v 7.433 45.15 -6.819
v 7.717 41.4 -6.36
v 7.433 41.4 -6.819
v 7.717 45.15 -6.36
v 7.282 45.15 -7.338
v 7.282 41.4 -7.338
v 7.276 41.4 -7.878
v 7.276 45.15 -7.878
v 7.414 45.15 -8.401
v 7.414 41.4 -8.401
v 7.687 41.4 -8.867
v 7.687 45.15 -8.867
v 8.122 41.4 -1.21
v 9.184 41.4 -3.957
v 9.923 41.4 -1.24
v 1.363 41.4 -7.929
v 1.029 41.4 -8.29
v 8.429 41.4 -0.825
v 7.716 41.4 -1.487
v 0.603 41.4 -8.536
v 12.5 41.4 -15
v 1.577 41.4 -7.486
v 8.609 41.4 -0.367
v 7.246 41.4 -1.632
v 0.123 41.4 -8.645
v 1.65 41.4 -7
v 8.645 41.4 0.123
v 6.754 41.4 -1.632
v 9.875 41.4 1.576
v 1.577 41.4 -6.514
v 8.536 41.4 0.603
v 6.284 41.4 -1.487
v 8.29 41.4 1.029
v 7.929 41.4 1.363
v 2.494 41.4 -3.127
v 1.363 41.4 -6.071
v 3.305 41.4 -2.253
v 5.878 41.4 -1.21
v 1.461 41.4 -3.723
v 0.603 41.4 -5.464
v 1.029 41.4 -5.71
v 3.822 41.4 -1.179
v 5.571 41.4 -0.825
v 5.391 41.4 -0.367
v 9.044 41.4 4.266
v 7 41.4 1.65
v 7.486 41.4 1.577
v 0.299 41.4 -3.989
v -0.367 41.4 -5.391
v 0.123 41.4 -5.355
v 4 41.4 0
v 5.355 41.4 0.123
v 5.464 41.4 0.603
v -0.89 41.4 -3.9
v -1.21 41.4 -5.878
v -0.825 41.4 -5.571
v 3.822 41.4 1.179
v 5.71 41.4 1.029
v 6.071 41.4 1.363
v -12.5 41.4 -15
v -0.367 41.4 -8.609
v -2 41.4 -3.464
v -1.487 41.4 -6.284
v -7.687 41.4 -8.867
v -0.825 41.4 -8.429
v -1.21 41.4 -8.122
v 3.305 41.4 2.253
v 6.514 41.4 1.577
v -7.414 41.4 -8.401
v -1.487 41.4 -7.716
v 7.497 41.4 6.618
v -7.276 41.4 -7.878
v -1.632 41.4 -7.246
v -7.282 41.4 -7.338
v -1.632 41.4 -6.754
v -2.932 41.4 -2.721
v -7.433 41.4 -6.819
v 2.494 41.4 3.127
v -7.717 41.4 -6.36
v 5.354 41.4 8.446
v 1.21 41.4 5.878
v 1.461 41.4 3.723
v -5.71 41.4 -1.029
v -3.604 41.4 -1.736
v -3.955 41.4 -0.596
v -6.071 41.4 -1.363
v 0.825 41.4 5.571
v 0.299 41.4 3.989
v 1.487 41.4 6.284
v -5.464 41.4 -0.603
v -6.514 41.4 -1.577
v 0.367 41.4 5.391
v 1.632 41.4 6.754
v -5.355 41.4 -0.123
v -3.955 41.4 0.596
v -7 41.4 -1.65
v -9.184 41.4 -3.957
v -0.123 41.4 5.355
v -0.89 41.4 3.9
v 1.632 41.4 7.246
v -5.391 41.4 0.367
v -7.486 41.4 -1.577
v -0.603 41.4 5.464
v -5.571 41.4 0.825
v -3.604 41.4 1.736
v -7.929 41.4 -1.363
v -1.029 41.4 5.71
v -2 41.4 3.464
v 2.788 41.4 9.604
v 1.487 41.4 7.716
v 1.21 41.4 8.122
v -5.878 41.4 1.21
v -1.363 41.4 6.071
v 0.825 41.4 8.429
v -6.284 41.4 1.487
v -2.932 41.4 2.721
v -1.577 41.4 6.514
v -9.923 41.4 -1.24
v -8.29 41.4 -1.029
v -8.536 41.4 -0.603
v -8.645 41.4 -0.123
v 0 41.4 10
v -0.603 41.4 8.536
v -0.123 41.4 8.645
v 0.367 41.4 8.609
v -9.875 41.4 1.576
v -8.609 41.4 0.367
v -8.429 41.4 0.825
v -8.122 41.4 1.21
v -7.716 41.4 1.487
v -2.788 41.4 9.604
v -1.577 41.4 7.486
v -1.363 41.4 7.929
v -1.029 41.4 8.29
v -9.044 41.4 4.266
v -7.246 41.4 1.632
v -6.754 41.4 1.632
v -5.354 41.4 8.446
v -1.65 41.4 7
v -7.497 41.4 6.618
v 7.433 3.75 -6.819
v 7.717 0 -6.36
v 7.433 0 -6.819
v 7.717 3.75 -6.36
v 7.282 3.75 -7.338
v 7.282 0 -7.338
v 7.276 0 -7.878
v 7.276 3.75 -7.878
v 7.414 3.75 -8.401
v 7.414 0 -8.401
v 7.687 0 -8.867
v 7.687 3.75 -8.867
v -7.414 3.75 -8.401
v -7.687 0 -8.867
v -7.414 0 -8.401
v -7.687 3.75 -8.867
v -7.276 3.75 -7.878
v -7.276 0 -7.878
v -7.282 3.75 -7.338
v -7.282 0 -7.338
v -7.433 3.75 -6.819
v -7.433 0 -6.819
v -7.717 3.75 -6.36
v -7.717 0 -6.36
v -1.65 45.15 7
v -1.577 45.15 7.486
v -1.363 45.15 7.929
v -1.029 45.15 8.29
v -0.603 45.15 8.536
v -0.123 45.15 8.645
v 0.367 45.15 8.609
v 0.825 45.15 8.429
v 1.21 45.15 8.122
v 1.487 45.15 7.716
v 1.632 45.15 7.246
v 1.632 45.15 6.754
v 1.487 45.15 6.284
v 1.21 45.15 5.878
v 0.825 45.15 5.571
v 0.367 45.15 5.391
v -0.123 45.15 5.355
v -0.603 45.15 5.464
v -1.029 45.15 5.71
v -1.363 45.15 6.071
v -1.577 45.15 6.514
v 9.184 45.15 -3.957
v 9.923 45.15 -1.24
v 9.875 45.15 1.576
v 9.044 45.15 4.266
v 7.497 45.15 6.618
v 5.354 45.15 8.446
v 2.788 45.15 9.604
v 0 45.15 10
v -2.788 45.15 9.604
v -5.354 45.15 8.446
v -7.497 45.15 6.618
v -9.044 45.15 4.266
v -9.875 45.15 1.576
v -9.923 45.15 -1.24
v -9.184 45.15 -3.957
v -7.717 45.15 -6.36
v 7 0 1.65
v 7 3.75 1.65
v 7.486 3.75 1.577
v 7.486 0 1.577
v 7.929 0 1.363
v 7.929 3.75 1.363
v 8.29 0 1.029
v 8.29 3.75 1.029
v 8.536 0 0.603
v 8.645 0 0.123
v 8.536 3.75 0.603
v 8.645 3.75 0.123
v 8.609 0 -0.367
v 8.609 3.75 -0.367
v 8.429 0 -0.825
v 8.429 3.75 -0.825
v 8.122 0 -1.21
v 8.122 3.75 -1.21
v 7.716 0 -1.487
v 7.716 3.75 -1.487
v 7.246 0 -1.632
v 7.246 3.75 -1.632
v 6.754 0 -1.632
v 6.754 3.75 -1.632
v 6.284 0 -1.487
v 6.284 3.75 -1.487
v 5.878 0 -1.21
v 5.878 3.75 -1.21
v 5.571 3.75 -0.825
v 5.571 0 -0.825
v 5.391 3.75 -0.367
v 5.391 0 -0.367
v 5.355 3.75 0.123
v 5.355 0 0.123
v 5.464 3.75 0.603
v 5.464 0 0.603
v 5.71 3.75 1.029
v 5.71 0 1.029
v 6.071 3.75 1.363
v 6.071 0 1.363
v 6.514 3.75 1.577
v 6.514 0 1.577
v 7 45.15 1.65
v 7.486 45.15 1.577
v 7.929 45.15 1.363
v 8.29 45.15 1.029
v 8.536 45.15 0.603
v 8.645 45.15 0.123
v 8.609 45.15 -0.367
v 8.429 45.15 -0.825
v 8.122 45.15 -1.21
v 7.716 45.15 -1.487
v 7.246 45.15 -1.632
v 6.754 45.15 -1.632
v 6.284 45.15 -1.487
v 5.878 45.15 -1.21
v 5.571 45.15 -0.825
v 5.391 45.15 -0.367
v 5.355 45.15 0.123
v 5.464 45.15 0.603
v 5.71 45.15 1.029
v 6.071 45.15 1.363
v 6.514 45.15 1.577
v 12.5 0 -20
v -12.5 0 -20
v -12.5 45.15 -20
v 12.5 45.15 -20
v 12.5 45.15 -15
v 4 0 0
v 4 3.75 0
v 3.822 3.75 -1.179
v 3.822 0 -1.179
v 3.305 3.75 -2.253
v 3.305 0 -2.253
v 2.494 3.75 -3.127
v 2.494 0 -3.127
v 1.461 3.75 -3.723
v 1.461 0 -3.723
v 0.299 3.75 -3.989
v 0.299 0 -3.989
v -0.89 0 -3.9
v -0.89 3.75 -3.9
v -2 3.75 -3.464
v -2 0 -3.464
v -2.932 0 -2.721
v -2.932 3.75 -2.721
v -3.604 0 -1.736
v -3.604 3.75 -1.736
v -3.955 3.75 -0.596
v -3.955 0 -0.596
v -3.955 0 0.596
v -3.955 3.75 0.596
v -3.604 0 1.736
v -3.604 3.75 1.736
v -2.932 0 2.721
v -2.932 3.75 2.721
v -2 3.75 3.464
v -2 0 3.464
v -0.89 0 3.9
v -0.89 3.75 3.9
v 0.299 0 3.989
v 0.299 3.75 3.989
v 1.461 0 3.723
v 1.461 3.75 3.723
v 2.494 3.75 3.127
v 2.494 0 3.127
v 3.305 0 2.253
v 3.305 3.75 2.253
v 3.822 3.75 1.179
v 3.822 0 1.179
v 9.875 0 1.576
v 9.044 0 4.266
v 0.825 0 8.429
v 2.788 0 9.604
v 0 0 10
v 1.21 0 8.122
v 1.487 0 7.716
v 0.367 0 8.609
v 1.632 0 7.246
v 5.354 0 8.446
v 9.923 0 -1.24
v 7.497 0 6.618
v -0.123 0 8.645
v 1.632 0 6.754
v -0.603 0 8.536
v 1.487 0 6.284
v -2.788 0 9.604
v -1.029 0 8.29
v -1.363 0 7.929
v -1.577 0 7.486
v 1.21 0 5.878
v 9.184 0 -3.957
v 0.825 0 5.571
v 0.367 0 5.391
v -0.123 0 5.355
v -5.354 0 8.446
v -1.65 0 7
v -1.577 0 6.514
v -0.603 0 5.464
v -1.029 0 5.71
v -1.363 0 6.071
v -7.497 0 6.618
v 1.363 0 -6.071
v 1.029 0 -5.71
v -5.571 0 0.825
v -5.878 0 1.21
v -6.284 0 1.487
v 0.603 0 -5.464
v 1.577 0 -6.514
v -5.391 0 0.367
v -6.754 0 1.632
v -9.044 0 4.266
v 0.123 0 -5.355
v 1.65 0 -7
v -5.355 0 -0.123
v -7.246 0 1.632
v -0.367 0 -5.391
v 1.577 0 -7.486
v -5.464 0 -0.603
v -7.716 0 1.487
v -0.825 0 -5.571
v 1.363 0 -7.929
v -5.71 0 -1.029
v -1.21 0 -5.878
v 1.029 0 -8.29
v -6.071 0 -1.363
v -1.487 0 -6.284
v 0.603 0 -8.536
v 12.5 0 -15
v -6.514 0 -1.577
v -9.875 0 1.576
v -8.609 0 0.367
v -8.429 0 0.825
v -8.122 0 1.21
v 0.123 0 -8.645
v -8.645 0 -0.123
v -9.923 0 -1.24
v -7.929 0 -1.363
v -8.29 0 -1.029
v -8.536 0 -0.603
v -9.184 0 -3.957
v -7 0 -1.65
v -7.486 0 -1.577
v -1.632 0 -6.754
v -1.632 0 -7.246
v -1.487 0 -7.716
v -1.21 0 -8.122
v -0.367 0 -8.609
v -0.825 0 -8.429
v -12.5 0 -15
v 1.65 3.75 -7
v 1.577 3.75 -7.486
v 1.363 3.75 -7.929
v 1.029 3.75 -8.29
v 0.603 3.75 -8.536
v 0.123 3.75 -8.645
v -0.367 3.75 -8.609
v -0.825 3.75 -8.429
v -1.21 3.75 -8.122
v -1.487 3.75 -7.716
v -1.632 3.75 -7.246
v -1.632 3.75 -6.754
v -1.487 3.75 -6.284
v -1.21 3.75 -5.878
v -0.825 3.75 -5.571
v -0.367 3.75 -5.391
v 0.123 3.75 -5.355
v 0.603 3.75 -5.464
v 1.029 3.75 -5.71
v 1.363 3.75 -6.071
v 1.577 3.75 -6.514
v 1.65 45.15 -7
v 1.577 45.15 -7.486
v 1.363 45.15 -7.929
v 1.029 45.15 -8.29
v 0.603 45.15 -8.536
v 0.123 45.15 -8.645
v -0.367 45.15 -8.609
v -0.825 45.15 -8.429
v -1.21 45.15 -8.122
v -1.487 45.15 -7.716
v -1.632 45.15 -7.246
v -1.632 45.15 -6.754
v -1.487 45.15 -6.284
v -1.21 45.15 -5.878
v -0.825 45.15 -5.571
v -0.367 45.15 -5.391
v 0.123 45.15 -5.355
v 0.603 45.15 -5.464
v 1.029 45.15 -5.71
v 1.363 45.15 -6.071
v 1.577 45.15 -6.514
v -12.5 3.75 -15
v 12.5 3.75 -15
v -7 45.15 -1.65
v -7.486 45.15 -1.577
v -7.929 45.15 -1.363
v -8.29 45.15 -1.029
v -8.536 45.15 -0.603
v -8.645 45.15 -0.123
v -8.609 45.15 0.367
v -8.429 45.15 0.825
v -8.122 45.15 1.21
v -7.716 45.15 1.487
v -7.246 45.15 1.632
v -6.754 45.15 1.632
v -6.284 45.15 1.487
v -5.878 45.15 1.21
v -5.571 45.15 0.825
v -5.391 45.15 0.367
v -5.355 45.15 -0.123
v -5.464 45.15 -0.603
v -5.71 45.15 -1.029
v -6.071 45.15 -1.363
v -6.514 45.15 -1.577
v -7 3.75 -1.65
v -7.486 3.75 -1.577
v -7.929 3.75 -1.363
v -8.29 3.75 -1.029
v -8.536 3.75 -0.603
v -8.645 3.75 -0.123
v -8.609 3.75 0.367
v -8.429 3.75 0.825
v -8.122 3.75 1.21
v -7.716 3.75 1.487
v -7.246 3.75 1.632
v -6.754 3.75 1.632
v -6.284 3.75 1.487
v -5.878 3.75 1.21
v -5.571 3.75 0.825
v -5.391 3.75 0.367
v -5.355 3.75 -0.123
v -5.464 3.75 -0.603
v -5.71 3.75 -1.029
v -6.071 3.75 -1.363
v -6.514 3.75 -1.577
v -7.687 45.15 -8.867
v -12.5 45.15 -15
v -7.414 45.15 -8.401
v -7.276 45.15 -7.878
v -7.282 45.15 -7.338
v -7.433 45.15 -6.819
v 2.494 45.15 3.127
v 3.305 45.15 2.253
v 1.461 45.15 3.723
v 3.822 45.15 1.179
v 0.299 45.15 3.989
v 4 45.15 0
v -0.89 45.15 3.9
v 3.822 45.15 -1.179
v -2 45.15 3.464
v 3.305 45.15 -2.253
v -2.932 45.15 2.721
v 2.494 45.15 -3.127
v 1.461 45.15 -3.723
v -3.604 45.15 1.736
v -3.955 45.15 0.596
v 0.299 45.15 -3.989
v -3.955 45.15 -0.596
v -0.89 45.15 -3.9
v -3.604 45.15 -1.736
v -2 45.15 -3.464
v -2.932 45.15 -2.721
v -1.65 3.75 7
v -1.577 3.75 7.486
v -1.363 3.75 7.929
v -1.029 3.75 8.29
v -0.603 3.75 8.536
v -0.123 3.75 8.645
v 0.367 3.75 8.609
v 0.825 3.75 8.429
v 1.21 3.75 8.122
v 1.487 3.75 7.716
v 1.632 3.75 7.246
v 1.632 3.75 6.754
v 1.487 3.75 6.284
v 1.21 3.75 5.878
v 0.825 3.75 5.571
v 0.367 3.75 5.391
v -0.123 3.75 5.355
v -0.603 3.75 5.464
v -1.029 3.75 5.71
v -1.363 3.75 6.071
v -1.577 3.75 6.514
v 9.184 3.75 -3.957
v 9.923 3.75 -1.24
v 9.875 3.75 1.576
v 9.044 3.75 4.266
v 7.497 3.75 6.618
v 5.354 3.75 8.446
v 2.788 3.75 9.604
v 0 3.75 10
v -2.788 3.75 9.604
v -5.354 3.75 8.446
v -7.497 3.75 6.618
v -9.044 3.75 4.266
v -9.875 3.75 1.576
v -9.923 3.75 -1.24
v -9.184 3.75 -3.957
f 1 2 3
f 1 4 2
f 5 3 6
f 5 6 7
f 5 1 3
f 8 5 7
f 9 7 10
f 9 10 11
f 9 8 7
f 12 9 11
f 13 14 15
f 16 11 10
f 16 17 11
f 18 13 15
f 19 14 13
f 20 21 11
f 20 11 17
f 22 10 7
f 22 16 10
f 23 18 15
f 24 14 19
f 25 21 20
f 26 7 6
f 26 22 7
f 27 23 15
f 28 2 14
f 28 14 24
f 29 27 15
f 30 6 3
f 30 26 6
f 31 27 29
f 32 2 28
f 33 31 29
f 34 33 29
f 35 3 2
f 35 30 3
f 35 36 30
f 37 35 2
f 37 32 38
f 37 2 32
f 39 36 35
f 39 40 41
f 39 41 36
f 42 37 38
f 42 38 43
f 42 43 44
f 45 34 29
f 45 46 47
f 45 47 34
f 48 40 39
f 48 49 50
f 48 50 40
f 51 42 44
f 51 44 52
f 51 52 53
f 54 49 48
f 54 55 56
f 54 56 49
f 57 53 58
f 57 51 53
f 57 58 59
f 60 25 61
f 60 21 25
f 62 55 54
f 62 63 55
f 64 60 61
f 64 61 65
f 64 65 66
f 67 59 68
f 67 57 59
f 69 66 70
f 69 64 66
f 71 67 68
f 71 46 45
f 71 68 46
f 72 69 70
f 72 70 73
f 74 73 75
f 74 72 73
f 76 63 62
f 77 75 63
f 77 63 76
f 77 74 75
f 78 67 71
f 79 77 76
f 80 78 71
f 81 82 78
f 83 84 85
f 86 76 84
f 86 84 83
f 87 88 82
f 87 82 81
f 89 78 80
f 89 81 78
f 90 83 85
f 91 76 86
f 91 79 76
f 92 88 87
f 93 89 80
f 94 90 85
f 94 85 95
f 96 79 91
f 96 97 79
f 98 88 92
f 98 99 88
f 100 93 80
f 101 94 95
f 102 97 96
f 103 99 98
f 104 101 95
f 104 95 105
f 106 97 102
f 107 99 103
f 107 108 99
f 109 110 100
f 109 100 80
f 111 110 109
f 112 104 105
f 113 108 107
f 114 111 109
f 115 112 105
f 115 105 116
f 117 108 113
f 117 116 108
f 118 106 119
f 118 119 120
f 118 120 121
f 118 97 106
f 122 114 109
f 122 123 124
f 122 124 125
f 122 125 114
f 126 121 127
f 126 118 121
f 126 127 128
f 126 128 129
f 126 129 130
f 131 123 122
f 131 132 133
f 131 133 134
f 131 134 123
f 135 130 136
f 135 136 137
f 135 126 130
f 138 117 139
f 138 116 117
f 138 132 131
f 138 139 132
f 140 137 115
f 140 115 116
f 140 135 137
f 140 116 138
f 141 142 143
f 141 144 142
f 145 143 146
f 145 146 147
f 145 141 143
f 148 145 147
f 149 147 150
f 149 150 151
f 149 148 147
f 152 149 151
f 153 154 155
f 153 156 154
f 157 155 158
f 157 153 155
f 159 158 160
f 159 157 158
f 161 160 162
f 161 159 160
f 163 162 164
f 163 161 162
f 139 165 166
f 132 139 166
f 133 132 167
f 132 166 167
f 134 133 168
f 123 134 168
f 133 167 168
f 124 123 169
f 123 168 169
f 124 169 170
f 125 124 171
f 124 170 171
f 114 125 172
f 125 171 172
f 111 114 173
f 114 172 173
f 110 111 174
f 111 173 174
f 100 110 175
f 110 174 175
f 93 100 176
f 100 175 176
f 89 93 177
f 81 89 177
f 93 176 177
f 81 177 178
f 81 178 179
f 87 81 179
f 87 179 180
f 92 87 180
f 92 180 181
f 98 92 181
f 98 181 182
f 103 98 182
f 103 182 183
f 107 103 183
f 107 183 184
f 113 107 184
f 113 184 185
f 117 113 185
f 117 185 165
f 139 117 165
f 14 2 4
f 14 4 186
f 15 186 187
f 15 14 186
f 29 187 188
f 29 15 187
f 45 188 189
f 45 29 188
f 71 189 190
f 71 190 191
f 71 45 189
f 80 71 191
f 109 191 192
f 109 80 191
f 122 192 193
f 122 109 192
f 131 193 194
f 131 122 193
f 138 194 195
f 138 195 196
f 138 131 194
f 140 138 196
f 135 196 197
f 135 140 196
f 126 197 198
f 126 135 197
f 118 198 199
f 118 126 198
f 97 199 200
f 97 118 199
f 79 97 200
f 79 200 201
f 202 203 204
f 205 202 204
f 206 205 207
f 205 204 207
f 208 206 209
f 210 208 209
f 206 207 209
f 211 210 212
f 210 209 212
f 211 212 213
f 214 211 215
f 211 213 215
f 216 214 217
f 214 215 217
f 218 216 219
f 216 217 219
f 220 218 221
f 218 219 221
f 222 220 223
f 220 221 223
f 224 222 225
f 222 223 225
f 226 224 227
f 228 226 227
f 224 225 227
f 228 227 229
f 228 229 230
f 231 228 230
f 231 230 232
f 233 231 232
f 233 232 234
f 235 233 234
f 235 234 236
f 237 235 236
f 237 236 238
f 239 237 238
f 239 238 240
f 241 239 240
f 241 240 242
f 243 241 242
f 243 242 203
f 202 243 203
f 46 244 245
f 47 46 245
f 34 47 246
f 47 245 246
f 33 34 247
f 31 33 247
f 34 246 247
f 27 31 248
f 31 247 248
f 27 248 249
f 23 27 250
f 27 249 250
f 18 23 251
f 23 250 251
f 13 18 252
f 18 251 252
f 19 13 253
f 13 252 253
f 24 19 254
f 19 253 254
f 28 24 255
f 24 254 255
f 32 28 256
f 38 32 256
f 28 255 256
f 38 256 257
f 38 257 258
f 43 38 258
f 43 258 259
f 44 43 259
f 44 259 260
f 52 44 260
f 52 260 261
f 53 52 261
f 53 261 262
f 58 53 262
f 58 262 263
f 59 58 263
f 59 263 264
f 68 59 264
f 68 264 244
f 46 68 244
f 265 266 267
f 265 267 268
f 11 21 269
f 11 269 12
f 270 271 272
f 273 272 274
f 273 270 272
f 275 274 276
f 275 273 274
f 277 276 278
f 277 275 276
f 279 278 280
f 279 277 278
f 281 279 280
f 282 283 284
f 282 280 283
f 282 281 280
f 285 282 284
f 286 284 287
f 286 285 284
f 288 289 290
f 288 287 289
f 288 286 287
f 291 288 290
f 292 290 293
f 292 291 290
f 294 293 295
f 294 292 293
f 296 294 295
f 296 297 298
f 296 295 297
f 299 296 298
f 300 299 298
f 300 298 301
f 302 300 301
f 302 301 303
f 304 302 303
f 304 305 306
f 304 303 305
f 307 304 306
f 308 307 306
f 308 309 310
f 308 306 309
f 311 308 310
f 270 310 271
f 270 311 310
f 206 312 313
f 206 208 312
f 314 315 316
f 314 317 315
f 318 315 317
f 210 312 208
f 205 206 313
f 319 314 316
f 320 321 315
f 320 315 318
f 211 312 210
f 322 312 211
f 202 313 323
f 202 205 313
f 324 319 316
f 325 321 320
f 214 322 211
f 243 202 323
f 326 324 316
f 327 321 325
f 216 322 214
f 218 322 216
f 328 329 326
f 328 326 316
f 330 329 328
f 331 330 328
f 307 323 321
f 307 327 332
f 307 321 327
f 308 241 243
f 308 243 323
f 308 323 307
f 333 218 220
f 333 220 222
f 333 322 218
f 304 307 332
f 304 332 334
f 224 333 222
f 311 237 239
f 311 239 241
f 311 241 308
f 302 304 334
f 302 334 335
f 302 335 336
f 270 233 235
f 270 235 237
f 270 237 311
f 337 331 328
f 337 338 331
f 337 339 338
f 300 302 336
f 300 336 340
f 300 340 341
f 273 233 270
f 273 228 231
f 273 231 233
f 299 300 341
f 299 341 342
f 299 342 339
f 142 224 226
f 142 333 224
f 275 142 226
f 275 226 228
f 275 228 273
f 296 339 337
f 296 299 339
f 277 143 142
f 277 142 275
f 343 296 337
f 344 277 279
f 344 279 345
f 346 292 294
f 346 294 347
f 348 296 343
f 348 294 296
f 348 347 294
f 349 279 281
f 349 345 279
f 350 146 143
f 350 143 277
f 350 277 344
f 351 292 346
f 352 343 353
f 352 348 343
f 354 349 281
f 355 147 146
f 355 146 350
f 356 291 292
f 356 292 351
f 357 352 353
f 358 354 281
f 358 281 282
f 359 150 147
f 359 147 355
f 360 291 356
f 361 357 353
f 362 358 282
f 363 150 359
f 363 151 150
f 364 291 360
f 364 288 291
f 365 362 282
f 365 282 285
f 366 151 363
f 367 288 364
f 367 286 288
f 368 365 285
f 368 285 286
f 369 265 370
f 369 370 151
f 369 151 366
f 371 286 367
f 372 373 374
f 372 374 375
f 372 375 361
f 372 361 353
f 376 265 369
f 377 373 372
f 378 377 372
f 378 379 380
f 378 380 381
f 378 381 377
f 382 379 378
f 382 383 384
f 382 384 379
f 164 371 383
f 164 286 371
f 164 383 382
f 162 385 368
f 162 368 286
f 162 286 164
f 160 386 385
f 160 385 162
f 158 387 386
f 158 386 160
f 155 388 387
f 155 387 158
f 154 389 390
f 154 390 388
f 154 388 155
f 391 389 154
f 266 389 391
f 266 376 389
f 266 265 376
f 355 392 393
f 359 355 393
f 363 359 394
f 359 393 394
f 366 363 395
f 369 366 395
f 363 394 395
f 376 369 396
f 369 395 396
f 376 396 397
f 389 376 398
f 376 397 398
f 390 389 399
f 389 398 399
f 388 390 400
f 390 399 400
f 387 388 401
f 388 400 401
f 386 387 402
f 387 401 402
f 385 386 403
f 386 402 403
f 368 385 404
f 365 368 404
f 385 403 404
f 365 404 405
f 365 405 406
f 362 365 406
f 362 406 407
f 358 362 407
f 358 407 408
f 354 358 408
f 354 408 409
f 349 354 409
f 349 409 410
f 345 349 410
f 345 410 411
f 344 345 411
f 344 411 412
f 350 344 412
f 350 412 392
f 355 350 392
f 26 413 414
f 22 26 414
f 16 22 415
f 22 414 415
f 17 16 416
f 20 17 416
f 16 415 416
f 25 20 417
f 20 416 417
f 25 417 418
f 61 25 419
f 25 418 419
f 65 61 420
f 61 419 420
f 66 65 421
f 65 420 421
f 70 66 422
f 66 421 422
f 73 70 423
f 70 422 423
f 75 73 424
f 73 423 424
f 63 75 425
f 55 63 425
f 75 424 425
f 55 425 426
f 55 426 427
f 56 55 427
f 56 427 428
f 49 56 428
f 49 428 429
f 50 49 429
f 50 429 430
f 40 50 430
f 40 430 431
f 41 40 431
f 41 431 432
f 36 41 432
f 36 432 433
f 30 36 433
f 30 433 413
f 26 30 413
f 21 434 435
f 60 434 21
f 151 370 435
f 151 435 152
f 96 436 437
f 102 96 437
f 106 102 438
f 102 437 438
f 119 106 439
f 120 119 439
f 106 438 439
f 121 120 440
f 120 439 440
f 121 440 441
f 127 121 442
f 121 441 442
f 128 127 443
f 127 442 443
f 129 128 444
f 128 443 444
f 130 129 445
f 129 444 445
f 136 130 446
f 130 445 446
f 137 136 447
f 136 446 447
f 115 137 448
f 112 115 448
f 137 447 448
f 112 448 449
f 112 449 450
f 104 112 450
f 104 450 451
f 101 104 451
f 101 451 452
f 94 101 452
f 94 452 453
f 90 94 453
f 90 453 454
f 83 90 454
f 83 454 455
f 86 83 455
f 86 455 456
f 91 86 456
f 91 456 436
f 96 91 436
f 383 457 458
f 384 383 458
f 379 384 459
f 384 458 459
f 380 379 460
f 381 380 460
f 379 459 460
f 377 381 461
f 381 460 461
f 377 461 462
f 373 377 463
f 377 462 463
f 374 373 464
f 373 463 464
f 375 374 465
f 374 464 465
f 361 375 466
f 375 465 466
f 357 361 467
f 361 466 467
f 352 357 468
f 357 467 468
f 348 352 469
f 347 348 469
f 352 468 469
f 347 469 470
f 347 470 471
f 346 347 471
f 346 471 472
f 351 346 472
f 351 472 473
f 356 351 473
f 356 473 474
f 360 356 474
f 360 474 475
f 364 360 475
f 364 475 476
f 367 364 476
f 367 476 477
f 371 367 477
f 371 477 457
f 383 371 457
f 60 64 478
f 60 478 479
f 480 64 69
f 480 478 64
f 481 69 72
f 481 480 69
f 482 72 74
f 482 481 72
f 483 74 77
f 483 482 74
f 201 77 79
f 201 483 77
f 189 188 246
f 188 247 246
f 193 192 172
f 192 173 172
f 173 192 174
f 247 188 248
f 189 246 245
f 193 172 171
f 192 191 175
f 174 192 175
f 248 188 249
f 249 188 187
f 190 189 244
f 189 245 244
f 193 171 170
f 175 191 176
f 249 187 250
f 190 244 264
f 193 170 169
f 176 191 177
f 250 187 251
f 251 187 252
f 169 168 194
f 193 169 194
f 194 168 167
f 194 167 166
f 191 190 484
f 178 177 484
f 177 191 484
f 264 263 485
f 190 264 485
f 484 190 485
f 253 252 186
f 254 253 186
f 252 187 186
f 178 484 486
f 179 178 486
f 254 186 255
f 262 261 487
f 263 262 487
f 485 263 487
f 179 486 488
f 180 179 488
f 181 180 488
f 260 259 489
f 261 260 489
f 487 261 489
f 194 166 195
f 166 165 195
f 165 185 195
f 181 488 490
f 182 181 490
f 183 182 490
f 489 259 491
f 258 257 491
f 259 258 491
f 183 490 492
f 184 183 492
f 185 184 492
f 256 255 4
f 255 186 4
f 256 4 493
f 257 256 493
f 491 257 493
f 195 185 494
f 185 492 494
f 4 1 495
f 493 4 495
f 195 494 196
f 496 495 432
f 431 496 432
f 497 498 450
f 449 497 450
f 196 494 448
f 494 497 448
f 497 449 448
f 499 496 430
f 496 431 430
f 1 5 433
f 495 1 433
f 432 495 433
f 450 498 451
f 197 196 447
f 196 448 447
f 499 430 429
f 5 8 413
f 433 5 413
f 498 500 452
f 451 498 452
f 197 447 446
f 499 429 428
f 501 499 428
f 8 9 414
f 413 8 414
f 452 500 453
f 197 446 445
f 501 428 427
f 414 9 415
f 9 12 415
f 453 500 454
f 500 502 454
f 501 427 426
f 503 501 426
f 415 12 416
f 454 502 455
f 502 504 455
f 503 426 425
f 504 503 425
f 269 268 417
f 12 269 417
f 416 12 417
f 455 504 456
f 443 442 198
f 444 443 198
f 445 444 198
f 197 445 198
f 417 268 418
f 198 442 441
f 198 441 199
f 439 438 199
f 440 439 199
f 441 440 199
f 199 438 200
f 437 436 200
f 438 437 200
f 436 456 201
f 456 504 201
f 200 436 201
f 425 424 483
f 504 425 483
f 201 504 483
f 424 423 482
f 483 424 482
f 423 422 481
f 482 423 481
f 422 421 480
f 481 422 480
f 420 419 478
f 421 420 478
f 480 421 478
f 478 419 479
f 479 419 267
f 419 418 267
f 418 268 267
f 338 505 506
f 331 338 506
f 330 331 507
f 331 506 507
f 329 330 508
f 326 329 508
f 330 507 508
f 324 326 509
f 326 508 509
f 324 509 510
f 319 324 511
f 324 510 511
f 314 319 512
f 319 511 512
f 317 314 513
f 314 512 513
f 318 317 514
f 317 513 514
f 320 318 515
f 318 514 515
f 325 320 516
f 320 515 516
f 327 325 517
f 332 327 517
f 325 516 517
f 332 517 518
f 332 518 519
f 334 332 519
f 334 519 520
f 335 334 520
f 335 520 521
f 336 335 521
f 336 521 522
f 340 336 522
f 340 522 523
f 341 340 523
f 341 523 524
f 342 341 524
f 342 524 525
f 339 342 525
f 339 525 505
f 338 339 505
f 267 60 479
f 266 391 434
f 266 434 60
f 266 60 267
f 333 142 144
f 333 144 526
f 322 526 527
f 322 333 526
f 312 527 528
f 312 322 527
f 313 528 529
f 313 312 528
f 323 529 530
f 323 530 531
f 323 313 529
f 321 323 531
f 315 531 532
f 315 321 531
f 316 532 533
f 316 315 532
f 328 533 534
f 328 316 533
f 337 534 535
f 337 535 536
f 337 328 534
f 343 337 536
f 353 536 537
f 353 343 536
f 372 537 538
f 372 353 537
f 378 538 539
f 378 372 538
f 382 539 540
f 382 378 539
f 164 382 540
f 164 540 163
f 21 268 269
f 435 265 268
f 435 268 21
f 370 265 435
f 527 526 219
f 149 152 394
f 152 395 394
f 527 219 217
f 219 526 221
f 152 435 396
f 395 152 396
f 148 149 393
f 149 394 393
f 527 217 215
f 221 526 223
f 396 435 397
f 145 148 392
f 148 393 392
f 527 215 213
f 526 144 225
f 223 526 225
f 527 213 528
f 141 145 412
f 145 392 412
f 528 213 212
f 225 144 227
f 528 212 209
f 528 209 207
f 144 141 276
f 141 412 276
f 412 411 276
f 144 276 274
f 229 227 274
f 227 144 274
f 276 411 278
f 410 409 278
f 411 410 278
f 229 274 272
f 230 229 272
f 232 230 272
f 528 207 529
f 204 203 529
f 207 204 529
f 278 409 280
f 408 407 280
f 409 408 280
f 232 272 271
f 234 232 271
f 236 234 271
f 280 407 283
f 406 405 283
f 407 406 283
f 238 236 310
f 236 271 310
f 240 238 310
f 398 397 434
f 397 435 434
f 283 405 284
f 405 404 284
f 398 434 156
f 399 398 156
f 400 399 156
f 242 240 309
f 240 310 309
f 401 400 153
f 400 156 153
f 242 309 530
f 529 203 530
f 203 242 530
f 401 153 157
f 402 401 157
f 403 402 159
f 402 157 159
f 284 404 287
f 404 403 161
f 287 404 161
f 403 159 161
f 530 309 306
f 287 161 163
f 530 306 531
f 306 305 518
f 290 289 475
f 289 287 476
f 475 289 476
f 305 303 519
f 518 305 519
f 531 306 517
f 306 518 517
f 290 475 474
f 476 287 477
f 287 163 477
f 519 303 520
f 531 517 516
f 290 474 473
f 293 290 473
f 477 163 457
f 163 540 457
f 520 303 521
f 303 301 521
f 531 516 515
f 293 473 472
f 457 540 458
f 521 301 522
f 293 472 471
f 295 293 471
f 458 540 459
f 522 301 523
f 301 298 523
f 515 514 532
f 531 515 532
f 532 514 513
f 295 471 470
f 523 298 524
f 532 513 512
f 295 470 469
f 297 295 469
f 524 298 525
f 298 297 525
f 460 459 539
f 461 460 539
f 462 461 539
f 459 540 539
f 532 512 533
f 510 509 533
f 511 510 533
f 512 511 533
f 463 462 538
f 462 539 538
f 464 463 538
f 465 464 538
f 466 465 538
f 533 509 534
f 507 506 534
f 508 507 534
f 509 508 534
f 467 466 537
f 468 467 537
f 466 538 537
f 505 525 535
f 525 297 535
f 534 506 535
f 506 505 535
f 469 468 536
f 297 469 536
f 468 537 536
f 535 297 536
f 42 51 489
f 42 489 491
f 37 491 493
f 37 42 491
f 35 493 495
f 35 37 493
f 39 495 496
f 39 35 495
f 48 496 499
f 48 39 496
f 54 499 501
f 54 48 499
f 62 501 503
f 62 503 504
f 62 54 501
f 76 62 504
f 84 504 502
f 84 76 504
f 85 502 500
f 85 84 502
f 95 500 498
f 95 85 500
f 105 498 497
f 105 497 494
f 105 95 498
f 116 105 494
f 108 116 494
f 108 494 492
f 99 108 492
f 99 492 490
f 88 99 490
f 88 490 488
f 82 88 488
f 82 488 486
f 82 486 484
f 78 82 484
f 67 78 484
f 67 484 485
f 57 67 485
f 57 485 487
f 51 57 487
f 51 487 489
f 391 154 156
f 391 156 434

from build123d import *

# Parameters (mm, degrees)
SKETCH1_R           = 4
BOSS_EXTRUDE1_DEPTH = 45.15
SKETCH2_W           = 40
SKETCH2_H           = 37.65
CUT_EXTRUDE1_DEPTH  = 56.34909665
SKETCH3_R           = 1.65
CUT_EXTRUDE2_DEPTH  = 51.93890949
CIRPATTERN1_COUNT   = 4
FILLET1_R           = 2


with BuildPart() as part:
    # Sketch1 → Boss-Extrude1 (new body)
    with BuildSketch(Plane(origin=(0, 0, 0), x_dir=(1, 0, 0), z_dir=(0, 1, 0))):
        with BuildLine():
            Line((-12.5, 15), (-12.5, 20))
            Line((-12.5, 20), (12.5, 20))
            Line((12.5, 20), (12.5, 15))
            Line((12.5, 15), (6.614378278, 7.5))
            ThreePointArc((6.614378278, 7.5), (0, -10), (-6.614378278, 7.5))
            Line((-6.614378278, 7.5), (-12.5, 15))
        make_face()
        Circle(SKETCH1_R, mode=Mode.SUBTRACT)
    extrude(amount=BOSS_EXTRUDE1_DEPTH)

    # Sketch2 → Cut-Extrude1 (cut, through all)
    with BuildSketch(Plane.ZY.offset(12.5)):
        with Locations((5, 22.575)):
            Rectangle(SKETCH2_W, SKETCH2_H)
    extrude(amount=-CUT_EXTRUDE1_DEPTH, mode=Mode.SUBTRACT)

    # Sketch3 → Cut-Extrude2 (cut, through all)
    with BuildSketch(Plane(origin=(0, 45.15, 0), x_dir=(1, 0, 0), z_dir=(0, 1, 0))):
        with Locations((0, 7)):
            Circle(SKETCH3_R)
    cut_extrude2 = extrude(amount=-CUT_EXTRUDE2_DEPTH, mode=Mode.SUBTRACT)

    # CirPattern1: Cut-Extrude2 ×4 about axis
    cirpattern1_axis = Axis((0, 45.15, 0), (0, -1, 0))
    for i in range(1, CIRPATTERN1_COUNT):
        add(cut_extrude2.rotate(cirpattern1_axis, i * 360 / CIRPATTERN1_COUNT), mode=Mode.SUBTRACT)

    # Fillet1
    fillet1_edges = [part.edges().sort_by_distance(p)[0] for p in [
        (6.614378278, 43.275, -7.5),
        (6.614378278, 1.875, -7.5),
        (-6.614378278, 43.275, -7.5),
        (-6.614378278, 1.875, -7.5),
    ]]
    fillet(fillet1_edges, radius=FILLET1_R)


solid = part.part
